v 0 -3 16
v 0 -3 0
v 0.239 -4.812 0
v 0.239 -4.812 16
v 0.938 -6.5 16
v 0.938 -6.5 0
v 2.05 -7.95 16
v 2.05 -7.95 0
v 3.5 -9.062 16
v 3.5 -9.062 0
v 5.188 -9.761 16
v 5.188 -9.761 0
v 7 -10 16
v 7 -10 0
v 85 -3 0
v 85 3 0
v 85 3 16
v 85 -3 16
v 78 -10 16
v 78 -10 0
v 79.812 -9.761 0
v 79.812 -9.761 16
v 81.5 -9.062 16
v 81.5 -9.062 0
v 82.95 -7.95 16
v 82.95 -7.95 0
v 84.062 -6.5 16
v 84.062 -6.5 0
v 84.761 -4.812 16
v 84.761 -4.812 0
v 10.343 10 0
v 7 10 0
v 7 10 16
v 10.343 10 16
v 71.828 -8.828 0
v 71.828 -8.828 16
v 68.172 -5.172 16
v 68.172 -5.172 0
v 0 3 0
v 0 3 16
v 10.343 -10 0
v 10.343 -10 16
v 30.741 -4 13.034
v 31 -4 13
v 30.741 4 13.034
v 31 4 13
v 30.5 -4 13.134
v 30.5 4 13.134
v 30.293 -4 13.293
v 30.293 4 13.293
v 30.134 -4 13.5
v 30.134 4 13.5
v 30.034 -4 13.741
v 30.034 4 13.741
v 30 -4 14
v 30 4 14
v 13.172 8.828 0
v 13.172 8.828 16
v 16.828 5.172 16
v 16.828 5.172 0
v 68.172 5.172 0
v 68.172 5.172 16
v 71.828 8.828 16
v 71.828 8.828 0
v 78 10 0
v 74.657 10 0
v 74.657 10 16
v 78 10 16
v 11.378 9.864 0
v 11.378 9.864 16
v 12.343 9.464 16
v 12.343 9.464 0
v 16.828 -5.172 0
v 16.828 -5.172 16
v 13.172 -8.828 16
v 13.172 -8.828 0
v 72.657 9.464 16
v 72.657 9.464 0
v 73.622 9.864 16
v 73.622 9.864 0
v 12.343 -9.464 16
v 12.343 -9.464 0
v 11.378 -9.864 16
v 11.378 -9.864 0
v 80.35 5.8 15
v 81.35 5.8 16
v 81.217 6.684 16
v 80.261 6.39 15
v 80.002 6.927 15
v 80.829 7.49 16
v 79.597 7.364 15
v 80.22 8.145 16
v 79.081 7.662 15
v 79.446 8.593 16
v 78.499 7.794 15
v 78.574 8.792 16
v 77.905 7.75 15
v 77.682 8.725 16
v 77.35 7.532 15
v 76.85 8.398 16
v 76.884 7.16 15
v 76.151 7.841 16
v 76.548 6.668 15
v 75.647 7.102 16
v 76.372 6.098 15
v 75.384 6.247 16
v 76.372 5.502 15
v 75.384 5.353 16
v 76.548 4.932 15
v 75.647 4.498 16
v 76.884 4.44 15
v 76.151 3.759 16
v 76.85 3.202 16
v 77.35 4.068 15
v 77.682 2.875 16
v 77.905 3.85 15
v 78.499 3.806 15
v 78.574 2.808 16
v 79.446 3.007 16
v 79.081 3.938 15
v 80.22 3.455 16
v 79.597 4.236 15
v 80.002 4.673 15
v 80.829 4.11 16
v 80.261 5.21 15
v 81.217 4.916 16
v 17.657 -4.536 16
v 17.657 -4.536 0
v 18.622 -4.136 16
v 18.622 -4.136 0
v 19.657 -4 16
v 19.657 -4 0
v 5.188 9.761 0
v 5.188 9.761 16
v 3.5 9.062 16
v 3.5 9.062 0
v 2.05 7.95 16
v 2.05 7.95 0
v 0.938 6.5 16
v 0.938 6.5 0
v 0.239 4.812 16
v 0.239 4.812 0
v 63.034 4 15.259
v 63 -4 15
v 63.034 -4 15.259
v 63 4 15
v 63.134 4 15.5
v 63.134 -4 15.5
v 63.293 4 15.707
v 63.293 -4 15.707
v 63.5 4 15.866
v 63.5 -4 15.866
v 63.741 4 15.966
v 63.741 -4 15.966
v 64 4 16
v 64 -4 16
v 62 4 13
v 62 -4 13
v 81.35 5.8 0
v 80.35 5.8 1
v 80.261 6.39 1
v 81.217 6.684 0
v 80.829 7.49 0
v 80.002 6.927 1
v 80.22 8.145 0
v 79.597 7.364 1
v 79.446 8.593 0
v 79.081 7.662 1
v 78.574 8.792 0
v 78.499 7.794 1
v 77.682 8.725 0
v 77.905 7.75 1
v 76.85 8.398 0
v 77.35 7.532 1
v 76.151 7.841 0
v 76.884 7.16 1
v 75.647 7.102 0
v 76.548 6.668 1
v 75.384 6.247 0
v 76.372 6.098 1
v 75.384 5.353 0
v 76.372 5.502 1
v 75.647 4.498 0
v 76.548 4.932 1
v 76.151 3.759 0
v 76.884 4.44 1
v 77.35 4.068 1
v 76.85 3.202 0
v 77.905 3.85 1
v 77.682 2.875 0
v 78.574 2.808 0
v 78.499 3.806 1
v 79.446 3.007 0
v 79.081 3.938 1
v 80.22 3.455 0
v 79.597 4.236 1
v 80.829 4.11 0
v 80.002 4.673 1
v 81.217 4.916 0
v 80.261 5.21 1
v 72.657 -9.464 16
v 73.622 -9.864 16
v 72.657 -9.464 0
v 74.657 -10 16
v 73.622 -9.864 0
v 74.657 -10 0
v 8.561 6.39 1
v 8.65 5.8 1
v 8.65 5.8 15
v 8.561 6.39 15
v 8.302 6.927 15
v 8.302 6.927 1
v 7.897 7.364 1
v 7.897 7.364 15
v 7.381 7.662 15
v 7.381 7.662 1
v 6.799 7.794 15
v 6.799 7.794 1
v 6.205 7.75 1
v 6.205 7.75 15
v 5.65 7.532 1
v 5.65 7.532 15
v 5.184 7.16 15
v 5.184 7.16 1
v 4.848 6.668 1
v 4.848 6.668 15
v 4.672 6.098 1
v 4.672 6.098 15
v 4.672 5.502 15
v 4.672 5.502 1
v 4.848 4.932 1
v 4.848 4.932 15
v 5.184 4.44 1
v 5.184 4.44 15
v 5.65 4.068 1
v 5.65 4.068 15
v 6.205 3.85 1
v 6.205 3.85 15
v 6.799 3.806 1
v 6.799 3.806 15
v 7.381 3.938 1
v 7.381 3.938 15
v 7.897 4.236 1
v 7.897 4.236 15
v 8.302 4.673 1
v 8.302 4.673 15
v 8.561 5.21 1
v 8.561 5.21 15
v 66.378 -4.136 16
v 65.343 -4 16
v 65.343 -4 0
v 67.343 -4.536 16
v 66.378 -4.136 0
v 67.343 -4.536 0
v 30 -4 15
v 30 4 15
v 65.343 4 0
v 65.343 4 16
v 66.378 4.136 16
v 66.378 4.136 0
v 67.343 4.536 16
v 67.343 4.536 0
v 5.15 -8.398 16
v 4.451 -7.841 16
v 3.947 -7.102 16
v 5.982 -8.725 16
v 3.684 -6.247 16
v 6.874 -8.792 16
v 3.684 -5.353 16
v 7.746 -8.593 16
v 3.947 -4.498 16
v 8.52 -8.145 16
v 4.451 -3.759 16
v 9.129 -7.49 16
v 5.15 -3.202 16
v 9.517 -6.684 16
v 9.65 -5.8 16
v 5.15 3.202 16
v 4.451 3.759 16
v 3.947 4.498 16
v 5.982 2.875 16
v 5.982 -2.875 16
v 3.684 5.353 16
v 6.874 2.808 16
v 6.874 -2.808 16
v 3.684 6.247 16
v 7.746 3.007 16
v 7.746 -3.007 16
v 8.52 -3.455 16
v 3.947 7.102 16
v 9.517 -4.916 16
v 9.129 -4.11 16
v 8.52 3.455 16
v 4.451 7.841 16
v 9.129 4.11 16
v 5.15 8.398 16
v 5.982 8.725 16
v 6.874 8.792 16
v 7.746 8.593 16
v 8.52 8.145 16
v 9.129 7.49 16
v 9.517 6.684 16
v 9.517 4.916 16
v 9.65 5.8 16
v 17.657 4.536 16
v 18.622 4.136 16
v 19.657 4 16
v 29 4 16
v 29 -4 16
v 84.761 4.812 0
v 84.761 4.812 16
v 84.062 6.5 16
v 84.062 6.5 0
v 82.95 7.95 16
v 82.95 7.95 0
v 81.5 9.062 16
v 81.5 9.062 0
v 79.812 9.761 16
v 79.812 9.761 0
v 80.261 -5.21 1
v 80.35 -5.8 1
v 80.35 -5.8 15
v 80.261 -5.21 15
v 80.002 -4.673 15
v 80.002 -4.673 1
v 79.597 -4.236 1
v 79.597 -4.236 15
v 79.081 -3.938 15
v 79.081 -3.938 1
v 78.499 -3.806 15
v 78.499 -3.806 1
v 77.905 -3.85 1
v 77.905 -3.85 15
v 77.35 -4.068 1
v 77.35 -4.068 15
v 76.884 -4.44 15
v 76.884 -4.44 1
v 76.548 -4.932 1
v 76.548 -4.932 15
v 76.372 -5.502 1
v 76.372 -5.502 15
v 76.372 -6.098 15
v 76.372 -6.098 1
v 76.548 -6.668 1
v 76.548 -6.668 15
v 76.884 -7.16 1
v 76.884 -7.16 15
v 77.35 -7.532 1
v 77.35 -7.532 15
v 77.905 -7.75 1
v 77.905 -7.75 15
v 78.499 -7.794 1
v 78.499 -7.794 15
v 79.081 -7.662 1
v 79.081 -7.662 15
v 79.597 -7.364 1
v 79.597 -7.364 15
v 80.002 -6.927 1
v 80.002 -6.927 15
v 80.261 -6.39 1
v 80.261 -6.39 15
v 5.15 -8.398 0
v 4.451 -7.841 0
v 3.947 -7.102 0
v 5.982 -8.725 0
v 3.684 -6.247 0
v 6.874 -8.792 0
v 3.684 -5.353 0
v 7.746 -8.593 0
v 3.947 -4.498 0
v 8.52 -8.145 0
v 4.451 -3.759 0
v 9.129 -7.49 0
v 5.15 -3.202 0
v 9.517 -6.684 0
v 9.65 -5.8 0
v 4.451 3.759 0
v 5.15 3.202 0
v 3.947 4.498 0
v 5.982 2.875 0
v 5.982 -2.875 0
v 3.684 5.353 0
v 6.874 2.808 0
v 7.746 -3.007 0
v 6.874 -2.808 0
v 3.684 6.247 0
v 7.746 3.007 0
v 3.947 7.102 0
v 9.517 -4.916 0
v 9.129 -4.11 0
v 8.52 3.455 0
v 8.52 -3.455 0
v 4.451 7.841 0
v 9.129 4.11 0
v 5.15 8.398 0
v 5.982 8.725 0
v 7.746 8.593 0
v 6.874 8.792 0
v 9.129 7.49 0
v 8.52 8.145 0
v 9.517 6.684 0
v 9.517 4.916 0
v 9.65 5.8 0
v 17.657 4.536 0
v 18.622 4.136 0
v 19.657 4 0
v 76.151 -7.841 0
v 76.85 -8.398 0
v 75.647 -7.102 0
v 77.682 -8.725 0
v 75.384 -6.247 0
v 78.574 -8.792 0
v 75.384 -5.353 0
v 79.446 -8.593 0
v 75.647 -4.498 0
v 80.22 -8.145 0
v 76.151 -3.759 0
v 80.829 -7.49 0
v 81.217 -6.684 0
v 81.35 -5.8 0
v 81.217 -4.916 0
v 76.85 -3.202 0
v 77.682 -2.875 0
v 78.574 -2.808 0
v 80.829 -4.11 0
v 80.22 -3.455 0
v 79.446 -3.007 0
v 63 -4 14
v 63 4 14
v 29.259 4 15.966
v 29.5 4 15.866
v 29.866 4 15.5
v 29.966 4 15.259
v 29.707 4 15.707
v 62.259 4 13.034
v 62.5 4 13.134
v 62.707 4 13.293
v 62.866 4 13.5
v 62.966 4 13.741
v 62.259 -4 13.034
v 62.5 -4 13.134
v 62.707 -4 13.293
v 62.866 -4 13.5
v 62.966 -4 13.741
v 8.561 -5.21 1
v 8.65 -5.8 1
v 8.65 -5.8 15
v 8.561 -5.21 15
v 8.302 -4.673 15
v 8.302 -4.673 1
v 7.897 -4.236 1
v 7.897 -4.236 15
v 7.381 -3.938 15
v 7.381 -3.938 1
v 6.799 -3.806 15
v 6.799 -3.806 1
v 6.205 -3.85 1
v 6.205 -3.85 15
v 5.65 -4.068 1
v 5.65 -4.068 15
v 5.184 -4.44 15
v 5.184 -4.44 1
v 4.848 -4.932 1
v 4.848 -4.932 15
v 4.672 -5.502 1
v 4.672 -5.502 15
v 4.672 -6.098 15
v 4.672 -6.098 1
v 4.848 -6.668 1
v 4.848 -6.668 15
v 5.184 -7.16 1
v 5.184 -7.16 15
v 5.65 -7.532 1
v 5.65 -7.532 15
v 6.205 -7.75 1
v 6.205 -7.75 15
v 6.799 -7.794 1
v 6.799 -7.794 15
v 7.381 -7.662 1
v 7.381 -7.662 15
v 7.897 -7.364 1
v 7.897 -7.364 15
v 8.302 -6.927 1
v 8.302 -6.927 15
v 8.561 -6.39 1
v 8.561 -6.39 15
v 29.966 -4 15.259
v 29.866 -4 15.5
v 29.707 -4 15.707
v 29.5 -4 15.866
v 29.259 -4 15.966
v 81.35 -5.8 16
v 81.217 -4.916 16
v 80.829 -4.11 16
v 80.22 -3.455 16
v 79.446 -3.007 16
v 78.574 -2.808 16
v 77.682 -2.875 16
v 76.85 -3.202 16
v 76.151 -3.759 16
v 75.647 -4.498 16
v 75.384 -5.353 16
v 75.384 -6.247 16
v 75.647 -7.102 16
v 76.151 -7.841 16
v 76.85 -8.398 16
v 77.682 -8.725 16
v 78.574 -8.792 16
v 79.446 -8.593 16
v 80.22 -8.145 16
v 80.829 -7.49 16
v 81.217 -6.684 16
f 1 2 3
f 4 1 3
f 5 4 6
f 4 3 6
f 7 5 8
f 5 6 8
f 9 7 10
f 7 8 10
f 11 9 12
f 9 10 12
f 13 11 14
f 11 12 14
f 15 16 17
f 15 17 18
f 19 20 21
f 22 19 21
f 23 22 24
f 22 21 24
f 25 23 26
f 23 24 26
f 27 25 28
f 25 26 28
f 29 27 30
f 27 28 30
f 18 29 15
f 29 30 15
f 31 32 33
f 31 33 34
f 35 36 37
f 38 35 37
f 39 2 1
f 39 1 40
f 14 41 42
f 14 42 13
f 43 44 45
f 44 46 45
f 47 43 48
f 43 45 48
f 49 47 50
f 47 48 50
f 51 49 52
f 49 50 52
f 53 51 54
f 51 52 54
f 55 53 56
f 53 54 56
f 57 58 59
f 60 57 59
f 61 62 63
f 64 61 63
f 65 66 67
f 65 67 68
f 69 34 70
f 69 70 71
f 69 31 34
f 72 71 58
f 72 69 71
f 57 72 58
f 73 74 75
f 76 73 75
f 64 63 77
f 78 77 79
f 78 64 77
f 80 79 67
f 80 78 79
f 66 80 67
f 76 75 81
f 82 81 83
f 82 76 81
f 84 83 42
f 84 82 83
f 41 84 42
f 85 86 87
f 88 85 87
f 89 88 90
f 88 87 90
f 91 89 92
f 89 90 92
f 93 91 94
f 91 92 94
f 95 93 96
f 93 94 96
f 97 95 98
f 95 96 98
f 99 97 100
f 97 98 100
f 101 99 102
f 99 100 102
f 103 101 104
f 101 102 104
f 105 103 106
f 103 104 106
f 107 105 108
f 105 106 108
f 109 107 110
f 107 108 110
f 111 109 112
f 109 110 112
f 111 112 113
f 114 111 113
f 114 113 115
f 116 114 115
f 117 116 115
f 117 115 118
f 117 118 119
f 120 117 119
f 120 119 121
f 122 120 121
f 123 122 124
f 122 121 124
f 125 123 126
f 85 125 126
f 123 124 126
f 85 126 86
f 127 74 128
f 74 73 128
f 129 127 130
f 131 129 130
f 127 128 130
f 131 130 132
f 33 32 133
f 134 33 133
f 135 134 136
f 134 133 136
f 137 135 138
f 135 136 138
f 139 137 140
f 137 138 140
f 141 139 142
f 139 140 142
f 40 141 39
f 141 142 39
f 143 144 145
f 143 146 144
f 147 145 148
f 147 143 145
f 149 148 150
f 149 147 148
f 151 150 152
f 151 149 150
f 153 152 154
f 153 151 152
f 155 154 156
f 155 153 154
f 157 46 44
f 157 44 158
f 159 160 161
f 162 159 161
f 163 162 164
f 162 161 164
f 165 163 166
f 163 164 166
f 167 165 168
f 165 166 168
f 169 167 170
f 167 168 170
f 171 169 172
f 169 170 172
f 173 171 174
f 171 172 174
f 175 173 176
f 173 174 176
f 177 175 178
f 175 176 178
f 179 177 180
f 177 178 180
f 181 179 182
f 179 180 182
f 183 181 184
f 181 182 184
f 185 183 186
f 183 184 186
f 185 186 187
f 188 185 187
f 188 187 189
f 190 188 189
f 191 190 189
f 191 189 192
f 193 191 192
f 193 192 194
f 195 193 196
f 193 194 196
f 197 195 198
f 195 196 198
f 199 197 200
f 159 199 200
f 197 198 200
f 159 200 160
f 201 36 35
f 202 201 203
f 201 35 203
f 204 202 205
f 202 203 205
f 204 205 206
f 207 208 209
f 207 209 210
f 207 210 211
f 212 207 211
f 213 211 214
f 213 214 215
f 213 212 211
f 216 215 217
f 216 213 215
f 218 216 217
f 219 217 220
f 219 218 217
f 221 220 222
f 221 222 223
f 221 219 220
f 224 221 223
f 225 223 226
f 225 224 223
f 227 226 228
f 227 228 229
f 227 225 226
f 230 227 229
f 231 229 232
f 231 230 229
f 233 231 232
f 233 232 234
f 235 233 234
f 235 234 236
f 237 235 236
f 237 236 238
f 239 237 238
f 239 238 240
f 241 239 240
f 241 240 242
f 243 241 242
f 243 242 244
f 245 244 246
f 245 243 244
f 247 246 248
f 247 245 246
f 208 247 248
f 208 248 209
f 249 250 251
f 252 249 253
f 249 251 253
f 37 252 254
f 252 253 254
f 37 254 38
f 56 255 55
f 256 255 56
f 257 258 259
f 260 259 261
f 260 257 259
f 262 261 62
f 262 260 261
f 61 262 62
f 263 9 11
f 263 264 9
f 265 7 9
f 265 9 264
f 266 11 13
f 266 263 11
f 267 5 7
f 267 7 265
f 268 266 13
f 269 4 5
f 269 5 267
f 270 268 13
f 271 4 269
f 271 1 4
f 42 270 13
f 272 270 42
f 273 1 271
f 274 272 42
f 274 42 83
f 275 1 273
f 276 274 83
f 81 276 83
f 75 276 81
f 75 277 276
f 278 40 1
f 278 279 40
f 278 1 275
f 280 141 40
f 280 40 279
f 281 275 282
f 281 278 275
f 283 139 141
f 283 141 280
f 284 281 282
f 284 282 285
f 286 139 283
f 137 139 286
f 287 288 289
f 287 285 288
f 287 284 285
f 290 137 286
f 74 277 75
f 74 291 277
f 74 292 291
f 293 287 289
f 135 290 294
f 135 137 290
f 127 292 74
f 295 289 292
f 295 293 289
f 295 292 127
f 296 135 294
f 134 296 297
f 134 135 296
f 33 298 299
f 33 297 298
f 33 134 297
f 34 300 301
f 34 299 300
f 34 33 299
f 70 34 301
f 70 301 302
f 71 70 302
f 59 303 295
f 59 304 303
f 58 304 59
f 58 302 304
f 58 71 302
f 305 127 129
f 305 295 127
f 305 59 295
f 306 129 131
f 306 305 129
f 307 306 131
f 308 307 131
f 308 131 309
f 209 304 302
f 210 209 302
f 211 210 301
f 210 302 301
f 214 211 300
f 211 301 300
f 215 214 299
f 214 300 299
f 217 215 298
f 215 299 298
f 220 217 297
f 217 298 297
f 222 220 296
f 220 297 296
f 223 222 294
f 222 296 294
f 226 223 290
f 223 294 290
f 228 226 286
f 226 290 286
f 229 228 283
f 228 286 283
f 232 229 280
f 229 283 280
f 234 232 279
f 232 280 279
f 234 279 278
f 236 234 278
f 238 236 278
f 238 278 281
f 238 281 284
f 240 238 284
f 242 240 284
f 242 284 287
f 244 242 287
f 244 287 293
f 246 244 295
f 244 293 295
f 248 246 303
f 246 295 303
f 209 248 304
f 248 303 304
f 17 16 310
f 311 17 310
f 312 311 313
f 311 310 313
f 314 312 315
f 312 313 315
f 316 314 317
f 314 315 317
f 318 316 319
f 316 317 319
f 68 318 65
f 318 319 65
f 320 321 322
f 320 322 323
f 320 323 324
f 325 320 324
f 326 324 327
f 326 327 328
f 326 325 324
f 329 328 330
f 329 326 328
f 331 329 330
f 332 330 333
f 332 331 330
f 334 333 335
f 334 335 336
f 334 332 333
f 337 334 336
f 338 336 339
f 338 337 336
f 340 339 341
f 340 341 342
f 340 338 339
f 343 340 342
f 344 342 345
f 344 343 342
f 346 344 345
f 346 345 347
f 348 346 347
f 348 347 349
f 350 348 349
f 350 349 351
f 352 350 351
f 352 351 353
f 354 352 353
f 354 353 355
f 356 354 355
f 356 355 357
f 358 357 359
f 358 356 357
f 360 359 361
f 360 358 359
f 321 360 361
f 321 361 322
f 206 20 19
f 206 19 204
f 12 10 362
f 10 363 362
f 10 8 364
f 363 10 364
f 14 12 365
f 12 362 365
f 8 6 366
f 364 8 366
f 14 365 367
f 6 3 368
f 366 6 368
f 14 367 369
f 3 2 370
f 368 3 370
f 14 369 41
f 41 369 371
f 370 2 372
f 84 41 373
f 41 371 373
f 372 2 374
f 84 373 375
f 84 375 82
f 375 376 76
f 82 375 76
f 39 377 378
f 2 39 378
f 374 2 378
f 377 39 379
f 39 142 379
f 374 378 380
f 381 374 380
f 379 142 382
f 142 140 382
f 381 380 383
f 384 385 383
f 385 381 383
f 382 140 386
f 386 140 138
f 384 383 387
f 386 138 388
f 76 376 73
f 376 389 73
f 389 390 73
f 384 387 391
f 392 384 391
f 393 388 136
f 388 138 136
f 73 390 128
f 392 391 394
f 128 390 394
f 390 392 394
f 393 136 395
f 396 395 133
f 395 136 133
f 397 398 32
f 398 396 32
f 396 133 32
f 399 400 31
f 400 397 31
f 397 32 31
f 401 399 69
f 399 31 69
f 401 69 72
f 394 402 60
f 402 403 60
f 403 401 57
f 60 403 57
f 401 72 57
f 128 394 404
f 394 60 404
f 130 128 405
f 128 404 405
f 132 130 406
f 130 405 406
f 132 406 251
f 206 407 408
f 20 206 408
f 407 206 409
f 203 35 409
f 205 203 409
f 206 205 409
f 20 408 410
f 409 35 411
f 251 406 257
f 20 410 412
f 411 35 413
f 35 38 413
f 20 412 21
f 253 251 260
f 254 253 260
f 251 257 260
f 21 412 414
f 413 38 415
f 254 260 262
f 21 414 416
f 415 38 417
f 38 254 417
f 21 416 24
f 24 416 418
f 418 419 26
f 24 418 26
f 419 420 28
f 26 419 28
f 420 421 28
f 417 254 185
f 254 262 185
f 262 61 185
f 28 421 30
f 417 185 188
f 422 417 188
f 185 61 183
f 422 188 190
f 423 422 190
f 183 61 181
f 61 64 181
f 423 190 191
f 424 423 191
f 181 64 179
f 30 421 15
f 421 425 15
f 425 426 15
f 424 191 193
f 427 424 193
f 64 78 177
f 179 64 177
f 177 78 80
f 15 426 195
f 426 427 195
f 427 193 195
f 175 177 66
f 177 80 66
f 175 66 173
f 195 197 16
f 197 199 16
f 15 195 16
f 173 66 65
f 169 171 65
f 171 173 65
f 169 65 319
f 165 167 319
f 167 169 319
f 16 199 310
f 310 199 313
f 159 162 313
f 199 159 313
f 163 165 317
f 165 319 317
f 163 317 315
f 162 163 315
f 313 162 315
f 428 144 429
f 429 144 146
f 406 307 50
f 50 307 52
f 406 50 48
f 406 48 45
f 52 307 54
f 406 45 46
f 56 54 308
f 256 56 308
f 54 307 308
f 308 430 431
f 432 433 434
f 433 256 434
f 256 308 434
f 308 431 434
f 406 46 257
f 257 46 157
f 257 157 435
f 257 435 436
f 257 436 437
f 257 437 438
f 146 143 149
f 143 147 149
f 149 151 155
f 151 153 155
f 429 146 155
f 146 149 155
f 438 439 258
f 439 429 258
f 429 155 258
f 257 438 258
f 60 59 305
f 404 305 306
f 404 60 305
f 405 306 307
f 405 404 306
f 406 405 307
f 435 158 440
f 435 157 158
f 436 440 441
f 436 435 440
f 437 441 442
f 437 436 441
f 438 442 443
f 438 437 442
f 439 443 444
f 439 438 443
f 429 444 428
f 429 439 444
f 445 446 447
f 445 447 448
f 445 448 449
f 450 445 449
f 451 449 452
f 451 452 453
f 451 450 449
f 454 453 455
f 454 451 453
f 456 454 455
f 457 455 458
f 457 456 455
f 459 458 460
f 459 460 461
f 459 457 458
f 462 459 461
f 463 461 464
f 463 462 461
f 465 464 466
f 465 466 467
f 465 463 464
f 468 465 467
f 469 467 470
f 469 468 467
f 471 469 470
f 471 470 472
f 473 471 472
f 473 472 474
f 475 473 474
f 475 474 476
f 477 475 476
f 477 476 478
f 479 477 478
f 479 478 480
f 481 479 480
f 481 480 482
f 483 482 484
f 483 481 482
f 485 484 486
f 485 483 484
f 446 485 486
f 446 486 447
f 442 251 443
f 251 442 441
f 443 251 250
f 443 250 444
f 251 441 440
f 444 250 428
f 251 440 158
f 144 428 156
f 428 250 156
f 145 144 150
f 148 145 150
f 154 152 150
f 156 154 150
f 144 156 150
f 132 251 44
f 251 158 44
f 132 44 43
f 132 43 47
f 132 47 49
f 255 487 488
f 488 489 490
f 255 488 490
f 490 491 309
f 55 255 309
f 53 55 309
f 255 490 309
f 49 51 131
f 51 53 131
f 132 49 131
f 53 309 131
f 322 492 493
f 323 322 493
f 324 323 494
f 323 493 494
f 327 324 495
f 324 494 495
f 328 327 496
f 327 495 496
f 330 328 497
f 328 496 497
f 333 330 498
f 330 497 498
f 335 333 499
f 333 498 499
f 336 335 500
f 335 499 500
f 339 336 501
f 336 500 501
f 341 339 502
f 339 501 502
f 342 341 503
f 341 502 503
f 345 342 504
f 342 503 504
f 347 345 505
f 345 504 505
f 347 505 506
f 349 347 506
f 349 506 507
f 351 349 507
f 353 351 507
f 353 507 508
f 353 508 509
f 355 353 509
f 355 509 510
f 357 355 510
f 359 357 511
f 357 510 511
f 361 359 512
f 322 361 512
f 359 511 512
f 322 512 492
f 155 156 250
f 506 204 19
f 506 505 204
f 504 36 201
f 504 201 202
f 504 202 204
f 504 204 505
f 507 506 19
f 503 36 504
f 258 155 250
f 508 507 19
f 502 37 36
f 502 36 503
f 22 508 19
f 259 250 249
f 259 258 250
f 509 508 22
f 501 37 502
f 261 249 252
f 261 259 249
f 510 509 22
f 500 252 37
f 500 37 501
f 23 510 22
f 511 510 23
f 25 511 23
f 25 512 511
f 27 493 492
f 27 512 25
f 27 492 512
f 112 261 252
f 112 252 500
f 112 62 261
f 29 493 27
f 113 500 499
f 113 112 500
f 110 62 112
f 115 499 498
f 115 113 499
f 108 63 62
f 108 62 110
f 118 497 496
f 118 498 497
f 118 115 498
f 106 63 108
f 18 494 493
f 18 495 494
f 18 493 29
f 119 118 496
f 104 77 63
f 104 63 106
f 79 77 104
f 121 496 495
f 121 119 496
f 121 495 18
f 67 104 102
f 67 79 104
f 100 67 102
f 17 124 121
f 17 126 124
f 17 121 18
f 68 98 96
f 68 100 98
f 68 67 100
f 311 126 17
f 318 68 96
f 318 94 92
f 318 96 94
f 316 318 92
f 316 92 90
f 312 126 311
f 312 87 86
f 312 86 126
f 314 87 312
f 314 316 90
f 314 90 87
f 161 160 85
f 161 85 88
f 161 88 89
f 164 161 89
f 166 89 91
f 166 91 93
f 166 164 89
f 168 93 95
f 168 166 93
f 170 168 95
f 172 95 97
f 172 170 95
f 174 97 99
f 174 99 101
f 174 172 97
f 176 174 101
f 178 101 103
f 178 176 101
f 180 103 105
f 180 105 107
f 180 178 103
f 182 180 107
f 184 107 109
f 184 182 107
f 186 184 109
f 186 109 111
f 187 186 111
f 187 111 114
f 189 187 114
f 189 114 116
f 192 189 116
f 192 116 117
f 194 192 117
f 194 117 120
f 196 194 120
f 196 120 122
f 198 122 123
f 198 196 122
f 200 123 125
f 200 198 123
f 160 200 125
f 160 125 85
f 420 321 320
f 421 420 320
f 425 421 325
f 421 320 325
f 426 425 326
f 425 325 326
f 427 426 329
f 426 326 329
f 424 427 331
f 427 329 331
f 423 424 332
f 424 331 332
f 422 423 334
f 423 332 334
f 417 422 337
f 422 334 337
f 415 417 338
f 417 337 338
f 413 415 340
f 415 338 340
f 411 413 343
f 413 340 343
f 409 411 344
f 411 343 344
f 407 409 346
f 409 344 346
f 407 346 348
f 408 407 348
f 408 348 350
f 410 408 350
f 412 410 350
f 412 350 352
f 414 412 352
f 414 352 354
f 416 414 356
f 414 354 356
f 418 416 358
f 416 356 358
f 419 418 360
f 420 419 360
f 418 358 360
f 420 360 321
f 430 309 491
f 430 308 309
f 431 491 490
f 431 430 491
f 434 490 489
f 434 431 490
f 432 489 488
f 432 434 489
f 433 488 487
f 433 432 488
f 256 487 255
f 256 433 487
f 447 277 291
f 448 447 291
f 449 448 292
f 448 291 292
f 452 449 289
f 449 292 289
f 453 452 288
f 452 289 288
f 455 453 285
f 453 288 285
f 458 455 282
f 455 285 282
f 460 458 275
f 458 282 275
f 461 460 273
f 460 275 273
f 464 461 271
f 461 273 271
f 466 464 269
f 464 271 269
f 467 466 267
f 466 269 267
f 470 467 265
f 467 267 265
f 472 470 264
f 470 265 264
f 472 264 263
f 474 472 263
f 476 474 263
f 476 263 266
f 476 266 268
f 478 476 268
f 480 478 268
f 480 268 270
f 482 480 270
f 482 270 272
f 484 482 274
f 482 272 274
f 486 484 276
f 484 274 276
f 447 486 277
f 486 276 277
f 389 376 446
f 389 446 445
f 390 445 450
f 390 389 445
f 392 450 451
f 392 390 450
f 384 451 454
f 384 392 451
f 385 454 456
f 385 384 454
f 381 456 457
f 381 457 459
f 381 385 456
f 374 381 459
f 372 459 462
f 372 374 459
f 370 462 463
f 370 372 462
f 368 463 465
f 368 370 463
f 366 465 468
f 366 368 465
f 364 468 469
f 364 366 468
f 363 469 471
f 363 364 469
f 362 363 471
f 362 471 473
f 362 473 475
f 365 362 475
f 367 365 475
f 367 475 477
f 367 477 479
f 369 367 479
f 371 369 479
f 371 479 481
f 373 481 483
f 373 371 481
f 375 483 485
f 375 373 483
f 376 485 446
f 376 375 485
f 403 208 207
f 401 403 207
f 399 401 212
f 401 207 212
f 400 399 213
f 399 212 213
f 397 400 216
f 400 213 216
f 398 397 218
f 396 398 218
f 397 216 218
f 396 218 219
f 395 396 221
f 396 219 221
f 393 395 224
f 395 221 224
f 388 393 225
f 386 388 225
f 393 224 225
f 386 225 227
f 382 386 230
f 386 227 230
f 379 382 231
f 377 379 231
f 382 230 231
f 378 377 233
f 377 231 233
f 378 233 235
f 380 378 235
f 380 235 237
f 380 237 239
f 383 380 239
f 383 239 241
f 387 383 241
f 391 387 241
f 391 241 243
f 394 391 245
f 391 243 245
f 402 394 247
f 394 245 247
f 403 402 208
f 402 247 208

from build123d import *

# Parameters (mm, degrees)
SKETCH_R        = 2
PAD_DEPTH       = 16
CHAMFER_SIZE    = 1
CHAMFER001_SIZE = 1
POCKET_DEPTH    = 16.001
FILLET_R        = 4
FILLET001_R     = 4
FILLET002_R     = 4
FILLET003_R     = 4
FILLET004_R     = 4
SKETCH002_W     = 33
SKETCH002_H     = 10
POCKET001_DEPTH = 3
FILLET005_R     = 1
FILLET006_R     = 1
FILLET007_R     = 1


with BuildPart() as part:
    # Sketch → Pad (new body)
    with BuildSketch(Plane.XY):
        with BuildLine():
            ThreePointArc((7, 10), (2.050253, 7.949747), (0, 3))
            Line((0, -3), (0, 3))
            ThreePointArc((0, -3), (2.050253, -7.949747), (7, -10))
            Line((78, -10), (7, -10))
            ThreePointArc((78, -10), (82.949747, -7.949747), (85, -3))
            Line((85, 3), (85, -3))
            ThreePointArc((85, 3), (82.949747, 7.949747), (78, 10))
            Line((7, 10), (78, 10))
        make_face()
        with Locations((6.65, 5.8)):
            Circle(SKETCH_R, mode=Mode.SUBTRACT)
        with Locations((78.35, 5.8)):
            Circle(SKETCH_R, mode=Mode.SUBTRACT)
        with Locations((6.65, -5.8)):
            Circle(SKETCH_R, mode=Mode.SUBTRACT)
        with Locations((78.35, -5.8)):
            Circle(SKETCH_R, mode=Mode.SUBTRACT)
    extrude(amount=PAD_DEPTH)

    # Chamfer
    chamfer_edges = [part.edges().sort_by_distance(p)[0] for p in [
        (76.35, 5.8, 16),
        (76.35, -5.8, 16),
        (4.65, 5.8, 16),
        (4.65, -5.8, 16),
    ]]
    chamfer(chamfer_edges, length=CHAMFER_SIZE)

    # Chamfer001
    chamfer001_edges = [part.edges().sort_by_distance(p)[0] for p in [
        (4.65, -5.8, 0),
        (76.35, -5.8, 0),
        (76.35, 5.8, 0),
        (4.65, 5.8, 0),
    ]]
    chamfer(chamfer001_edges, length=CHAMFER001_SIZE)

    # Sketch001 (on Face5 of Chamfer001) → Pocket (cut, through all)
    with BuildSketch(Plane.XY.offset(16)):
        Polygon((12, 10), (18, 4), (67, 4), (73, 10), align=None)
        Polygon((12, -10), (73, -10), (67, -4), (18, -4), align=None)
    extrude(amount=-POCKET_DEPTH, mode=Mode.SUBTRACT)

    # Fillet
    fillet_edges = [part.edges().sort_by_distance(p)[0] for p in [
        (12, -10, 8),
    ]]
    fillet(fillet_edges, radius=FILLET_R)

    # Fillet001
    fillet001_edges = [part.edges().sort_by_distance(p)[0] for p in [
        (18, -4, 8),
    ]]
    fillet(fillet001_edges, radius=FILLET001_R)

    # Fillet002
    fillet002_edges = [part.edges().sort_by_distance(p)[0] for p in [
        (73, -10, 8),
        (67, -4, 8),
    ]]
    fillet(fillet002_edges, radius=FILLET002_R)

    # Fillet003
    fillet003_edges = [part.edges().sort_by_distance(p)[0] for p in [
        (12, 10, 8),
        (18, 4, 8),
    ]]
    fillet(fillet003_edges, radius=FILLET003_R)

    # Fillet004
    fillet004_edges = [part.edges().sort_by_distance(p)[0] for p in [
        (73, 10, 8),
        (67, 4, 8),
    ]]
    fillet(fillet004_edges, radius=FILLET004_R)

    # Sketch002 (on Face30 of Fillet004) → Pocket001 (cut)
    with BuildSketch(Plane.XY.offset(16)):
        with Locations((46.5, 0)):
            Rectangle(SKETCH002_W, SKETCH002_H)
    extrude(amount=-POCKET001_DEPTH, mode=Mode.SUBTRACT)

    # Fillet005
    fillet005_edges = [part.edges().sort_by_distance(p)[0] for p in [
        (30, 0, 16),
        (63, 0, 16),
    ]]
    fillet(fillet005_edges, radius=FILLET005_R)

    # Fillet006
    fillet006_edges = [part.edges().sort_by_distance(p)[0] for p in [
        (63, 0, 13),
    ]]
    fillet(fillet006_edges, radius=FILLET006_R)

    # Fillet007
    fillet007_edges = [part.edges().sort_by_distance(p)[0] for p in [
        (30, 0, 13),
    ]]
    fillet(fillet007_edges, radius=FILLET007_R)


solid = part.part
